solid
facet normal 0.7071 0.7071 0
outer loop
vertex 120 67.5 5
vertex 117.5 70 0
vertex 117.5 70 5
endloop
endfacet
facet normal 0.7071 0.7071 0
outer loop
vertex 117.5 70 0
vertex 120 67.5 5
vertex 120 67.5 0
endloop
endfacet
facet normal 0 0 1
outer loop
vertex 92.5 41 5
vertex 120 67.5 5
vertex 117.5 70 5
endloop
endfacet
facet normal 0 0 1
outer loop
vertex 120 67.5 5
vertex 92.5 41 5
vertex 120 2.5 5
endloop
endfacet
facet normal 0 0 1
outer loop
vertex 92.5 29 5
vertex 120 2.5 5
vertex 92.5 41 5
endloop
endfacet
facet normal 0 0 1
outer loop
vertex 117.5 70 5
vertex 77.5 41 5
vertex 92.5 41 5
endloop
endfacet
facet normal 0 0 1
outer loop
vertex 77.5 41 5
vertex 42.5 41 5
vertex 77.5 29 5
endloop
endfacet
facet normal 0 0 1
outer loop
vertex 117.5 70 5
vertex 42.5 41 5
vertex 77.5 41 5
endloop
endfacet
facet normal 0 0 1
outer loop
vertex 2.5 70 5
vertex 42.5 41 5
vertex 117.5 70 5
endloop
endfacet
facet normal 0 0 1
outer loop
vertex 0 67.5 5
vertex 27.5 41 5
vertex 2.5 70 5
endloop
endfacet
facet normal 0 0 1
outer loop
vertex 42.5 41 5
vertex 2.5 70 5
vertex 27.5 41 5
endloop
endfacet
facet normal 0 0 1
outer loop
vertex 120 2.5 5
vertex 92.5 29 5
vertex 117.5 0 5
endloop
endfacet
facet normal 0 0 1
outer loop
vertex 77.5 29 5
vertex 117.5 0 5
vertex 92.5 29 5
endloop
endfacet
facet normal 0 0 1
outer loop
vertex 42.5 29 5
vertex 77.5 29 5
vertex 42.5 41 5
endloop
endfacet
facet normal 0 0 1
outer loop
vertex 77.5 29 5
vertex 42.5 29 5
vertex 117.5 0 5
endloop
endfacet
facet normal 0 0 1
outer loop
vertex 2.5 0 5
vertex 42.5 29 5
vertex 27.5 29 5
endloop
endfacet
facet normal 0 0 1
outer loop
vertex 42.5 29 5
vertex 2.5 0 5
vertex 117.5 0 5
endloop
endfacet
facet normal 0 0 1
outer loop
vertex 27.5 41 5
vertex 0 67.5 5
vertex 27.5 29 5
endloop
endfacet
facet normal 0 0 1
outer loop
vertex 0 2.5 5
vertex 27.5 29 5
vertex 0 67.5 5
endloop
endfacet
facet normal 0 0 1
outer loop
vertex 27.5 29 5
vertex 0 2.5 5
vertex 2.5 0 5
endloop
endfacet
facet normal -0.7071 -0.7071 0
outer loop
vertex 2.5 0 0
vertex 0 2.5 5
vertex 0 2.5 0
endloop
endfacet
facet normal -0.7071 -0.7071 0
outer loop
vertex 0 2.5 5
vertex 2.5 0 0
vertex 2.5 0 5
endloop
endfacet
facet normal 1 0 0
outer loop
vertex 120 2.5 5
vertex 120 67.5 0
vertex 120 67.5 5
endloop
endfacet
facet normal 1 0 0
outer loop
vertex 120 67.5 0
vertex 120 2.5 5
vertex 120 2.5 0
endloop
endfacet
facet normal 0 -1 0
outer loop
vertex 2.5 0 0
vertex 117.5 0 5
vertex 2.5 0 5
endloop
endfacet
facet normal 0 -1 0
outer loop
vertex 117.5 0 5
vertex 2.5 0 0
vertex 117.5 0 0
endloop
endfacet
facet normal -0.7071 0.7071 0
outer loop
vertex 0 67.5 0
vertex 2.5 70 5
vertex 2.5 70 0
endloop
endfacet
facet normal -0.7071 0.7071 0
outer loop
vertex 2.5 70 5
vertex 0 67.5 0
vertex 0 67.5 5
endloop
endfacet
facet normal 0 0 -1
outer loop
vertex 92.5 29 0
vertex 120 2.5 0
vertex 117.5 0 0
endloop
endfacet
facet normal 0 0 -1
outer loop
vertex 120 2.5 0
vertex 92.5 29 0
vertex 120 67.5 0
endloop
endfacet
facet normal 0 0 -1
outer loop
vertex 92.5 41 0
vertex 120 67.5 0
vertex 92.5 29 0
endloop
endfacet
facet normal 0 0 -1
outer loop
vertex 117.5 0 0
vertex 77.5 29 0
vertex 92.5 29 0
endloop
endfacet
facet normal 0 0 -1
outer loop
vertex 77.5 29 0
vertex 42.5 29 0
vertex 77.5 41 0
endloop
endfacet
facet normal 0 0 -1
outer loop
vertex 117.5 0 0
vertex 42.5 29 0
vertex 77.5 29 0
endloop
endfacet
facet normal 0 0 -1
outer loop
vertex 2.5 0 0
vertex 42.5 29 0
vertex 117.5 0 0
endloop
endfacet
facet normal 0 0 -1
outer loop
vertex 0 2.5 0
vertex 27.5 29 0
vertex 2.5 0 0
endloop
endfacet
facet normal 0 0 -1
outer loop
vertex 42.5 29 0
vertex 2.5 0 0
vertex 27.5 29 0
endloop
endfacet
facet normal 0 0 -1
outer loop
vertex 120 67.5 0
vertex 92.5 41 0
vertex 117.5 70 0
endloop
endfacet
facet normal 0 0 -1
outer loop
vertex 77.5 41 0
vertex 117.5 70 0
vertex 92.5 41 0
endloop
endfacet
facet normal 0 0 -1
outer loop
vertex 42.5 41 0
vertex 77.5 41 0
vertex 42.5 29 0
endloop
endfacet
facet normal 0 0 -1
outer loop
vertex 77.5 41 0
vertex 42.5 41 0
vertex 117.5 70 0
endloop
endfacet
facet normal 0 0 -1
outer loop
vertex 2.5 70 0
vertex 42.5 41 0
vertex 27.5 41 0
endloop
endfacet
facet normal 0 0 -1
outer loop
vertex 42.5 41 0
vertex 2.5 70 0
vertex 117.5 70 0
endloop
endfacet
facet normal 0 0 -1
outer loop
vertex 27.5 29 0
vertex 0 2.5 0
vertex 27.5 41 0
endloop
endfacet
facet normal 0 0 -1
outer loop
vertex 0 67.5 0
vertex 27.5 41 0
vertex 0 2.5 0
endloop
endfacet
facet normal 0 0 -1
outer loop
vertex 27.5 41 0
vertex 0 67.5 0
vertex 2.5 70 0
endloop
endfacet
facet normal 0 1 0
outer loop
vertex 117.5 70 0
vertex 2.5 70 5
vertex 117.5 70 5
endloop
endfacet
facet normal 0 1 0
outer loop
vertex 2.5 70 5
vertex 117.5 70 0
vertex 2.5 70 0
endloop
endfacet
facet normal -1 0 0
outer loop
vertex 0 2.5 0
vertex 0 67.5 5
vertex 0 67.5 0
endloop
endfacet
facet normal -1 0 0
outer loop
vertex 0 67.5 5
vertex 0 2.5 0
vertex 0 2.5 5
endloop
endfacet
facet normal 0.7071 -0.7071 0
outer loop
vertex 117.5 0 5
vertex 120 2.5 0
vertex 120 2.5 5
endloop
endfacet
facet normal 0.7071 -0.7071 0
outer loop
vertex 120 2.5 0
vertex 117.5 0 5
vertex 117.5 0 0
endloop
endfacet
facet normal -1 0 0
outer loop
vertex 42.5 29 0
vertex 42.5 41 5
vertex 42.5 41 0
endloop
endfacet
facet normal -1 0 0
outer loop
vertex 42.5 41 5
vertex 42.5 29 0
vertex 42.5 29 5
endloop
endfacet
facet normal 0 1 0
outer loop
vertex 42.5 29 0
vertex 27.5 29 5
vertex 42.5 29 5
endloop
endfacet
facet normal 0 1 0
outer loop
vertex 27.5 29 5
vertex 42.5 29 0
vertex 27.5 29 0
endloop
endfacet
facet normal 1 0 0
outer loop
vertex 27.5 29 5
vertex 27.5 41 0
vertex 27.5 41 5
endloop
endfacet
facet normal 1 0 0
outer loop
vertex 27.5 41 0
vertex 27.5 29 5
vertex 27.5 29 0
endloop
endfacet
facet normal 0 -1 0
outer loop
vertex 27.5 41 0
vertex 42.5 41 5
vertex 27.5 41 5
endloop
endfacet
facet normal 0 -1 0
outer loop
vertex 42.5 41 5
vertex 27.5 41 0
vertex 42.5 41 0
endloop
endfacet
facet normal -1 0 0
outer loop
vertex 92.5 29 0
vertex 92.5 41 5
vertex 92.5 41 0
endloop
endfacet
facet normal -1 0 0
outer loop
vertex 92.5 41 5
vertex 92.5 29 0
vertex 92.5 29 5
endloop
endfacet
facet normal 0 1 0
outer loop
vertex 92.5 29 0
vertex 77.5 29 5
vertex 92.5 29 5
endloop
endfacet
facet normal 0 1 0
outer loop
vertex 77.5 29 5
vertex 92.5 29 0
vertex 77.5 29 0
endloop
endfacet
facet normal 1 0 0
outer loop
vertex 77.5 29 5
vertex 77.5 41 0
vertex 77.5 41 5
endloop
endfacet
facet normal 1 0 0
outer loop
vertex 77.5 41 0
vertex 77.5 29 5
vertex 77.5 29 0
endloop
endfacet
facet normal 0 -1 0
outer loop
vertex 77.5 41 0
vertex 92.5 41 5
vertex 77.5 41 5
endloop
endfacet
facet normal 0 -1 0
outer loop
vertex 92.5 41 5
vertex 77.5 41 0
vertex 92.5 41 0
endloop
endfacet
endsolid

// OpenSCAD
$fn = 32;

// ----------------------------------------------------------------------
// Windowed plate: 2 voids, 120 x 70 x 5 mm
// ----------------------------------------------------------------------

// --- parameters (mm) ---
plate_l = 120;            // plate length, X
plate_w = 70;             // plate width, Y
plate_t = 5;              // plate thickness, Z
edge_margin = 10;         // wall from the plate edge to any window
windows = 2;              // number of windows in the row
win_l = 15;               // window length
win_w = 12;               // window width
win_pitch = 50;           // window pitch along X
depth_1 = 5;              // depth of void 1 (full thickness = through)
depth_2 = 5;              // depth of void 2 (full thickness = through)
corner_c = 2.5;           // corner chamfer of the plate

profile = [[2.5, 0], [117.5, 0], [120, 2.5], [120, 67.5], [117.5, 70], [2.5, 70], [0, 67.5], [0, 2.5]];  // primary outline, 8 points, counter clockwise
void_1 = [[27.5, 29], [42.5, 29], [42.5, 41], [27.5, 41]];  // window 1 of the row, 4 points
void_2 = [[77.5, 29], [92.5, 29], [92.5, 41], [77.5, 41]];  // window 2 of the row, 4 points

// --- the one profile operation ---
difference() {
  linear_extrude(height = plate_t) polygon(points = profile);
  translate([0, 0, -1])
    linear_extrude(height = plate_t + 2) polygon(points = void_1);
  translate([0, 0, -1])
    linear_extrude(height = plate_t + 2) polygon(points = void_2);
}
